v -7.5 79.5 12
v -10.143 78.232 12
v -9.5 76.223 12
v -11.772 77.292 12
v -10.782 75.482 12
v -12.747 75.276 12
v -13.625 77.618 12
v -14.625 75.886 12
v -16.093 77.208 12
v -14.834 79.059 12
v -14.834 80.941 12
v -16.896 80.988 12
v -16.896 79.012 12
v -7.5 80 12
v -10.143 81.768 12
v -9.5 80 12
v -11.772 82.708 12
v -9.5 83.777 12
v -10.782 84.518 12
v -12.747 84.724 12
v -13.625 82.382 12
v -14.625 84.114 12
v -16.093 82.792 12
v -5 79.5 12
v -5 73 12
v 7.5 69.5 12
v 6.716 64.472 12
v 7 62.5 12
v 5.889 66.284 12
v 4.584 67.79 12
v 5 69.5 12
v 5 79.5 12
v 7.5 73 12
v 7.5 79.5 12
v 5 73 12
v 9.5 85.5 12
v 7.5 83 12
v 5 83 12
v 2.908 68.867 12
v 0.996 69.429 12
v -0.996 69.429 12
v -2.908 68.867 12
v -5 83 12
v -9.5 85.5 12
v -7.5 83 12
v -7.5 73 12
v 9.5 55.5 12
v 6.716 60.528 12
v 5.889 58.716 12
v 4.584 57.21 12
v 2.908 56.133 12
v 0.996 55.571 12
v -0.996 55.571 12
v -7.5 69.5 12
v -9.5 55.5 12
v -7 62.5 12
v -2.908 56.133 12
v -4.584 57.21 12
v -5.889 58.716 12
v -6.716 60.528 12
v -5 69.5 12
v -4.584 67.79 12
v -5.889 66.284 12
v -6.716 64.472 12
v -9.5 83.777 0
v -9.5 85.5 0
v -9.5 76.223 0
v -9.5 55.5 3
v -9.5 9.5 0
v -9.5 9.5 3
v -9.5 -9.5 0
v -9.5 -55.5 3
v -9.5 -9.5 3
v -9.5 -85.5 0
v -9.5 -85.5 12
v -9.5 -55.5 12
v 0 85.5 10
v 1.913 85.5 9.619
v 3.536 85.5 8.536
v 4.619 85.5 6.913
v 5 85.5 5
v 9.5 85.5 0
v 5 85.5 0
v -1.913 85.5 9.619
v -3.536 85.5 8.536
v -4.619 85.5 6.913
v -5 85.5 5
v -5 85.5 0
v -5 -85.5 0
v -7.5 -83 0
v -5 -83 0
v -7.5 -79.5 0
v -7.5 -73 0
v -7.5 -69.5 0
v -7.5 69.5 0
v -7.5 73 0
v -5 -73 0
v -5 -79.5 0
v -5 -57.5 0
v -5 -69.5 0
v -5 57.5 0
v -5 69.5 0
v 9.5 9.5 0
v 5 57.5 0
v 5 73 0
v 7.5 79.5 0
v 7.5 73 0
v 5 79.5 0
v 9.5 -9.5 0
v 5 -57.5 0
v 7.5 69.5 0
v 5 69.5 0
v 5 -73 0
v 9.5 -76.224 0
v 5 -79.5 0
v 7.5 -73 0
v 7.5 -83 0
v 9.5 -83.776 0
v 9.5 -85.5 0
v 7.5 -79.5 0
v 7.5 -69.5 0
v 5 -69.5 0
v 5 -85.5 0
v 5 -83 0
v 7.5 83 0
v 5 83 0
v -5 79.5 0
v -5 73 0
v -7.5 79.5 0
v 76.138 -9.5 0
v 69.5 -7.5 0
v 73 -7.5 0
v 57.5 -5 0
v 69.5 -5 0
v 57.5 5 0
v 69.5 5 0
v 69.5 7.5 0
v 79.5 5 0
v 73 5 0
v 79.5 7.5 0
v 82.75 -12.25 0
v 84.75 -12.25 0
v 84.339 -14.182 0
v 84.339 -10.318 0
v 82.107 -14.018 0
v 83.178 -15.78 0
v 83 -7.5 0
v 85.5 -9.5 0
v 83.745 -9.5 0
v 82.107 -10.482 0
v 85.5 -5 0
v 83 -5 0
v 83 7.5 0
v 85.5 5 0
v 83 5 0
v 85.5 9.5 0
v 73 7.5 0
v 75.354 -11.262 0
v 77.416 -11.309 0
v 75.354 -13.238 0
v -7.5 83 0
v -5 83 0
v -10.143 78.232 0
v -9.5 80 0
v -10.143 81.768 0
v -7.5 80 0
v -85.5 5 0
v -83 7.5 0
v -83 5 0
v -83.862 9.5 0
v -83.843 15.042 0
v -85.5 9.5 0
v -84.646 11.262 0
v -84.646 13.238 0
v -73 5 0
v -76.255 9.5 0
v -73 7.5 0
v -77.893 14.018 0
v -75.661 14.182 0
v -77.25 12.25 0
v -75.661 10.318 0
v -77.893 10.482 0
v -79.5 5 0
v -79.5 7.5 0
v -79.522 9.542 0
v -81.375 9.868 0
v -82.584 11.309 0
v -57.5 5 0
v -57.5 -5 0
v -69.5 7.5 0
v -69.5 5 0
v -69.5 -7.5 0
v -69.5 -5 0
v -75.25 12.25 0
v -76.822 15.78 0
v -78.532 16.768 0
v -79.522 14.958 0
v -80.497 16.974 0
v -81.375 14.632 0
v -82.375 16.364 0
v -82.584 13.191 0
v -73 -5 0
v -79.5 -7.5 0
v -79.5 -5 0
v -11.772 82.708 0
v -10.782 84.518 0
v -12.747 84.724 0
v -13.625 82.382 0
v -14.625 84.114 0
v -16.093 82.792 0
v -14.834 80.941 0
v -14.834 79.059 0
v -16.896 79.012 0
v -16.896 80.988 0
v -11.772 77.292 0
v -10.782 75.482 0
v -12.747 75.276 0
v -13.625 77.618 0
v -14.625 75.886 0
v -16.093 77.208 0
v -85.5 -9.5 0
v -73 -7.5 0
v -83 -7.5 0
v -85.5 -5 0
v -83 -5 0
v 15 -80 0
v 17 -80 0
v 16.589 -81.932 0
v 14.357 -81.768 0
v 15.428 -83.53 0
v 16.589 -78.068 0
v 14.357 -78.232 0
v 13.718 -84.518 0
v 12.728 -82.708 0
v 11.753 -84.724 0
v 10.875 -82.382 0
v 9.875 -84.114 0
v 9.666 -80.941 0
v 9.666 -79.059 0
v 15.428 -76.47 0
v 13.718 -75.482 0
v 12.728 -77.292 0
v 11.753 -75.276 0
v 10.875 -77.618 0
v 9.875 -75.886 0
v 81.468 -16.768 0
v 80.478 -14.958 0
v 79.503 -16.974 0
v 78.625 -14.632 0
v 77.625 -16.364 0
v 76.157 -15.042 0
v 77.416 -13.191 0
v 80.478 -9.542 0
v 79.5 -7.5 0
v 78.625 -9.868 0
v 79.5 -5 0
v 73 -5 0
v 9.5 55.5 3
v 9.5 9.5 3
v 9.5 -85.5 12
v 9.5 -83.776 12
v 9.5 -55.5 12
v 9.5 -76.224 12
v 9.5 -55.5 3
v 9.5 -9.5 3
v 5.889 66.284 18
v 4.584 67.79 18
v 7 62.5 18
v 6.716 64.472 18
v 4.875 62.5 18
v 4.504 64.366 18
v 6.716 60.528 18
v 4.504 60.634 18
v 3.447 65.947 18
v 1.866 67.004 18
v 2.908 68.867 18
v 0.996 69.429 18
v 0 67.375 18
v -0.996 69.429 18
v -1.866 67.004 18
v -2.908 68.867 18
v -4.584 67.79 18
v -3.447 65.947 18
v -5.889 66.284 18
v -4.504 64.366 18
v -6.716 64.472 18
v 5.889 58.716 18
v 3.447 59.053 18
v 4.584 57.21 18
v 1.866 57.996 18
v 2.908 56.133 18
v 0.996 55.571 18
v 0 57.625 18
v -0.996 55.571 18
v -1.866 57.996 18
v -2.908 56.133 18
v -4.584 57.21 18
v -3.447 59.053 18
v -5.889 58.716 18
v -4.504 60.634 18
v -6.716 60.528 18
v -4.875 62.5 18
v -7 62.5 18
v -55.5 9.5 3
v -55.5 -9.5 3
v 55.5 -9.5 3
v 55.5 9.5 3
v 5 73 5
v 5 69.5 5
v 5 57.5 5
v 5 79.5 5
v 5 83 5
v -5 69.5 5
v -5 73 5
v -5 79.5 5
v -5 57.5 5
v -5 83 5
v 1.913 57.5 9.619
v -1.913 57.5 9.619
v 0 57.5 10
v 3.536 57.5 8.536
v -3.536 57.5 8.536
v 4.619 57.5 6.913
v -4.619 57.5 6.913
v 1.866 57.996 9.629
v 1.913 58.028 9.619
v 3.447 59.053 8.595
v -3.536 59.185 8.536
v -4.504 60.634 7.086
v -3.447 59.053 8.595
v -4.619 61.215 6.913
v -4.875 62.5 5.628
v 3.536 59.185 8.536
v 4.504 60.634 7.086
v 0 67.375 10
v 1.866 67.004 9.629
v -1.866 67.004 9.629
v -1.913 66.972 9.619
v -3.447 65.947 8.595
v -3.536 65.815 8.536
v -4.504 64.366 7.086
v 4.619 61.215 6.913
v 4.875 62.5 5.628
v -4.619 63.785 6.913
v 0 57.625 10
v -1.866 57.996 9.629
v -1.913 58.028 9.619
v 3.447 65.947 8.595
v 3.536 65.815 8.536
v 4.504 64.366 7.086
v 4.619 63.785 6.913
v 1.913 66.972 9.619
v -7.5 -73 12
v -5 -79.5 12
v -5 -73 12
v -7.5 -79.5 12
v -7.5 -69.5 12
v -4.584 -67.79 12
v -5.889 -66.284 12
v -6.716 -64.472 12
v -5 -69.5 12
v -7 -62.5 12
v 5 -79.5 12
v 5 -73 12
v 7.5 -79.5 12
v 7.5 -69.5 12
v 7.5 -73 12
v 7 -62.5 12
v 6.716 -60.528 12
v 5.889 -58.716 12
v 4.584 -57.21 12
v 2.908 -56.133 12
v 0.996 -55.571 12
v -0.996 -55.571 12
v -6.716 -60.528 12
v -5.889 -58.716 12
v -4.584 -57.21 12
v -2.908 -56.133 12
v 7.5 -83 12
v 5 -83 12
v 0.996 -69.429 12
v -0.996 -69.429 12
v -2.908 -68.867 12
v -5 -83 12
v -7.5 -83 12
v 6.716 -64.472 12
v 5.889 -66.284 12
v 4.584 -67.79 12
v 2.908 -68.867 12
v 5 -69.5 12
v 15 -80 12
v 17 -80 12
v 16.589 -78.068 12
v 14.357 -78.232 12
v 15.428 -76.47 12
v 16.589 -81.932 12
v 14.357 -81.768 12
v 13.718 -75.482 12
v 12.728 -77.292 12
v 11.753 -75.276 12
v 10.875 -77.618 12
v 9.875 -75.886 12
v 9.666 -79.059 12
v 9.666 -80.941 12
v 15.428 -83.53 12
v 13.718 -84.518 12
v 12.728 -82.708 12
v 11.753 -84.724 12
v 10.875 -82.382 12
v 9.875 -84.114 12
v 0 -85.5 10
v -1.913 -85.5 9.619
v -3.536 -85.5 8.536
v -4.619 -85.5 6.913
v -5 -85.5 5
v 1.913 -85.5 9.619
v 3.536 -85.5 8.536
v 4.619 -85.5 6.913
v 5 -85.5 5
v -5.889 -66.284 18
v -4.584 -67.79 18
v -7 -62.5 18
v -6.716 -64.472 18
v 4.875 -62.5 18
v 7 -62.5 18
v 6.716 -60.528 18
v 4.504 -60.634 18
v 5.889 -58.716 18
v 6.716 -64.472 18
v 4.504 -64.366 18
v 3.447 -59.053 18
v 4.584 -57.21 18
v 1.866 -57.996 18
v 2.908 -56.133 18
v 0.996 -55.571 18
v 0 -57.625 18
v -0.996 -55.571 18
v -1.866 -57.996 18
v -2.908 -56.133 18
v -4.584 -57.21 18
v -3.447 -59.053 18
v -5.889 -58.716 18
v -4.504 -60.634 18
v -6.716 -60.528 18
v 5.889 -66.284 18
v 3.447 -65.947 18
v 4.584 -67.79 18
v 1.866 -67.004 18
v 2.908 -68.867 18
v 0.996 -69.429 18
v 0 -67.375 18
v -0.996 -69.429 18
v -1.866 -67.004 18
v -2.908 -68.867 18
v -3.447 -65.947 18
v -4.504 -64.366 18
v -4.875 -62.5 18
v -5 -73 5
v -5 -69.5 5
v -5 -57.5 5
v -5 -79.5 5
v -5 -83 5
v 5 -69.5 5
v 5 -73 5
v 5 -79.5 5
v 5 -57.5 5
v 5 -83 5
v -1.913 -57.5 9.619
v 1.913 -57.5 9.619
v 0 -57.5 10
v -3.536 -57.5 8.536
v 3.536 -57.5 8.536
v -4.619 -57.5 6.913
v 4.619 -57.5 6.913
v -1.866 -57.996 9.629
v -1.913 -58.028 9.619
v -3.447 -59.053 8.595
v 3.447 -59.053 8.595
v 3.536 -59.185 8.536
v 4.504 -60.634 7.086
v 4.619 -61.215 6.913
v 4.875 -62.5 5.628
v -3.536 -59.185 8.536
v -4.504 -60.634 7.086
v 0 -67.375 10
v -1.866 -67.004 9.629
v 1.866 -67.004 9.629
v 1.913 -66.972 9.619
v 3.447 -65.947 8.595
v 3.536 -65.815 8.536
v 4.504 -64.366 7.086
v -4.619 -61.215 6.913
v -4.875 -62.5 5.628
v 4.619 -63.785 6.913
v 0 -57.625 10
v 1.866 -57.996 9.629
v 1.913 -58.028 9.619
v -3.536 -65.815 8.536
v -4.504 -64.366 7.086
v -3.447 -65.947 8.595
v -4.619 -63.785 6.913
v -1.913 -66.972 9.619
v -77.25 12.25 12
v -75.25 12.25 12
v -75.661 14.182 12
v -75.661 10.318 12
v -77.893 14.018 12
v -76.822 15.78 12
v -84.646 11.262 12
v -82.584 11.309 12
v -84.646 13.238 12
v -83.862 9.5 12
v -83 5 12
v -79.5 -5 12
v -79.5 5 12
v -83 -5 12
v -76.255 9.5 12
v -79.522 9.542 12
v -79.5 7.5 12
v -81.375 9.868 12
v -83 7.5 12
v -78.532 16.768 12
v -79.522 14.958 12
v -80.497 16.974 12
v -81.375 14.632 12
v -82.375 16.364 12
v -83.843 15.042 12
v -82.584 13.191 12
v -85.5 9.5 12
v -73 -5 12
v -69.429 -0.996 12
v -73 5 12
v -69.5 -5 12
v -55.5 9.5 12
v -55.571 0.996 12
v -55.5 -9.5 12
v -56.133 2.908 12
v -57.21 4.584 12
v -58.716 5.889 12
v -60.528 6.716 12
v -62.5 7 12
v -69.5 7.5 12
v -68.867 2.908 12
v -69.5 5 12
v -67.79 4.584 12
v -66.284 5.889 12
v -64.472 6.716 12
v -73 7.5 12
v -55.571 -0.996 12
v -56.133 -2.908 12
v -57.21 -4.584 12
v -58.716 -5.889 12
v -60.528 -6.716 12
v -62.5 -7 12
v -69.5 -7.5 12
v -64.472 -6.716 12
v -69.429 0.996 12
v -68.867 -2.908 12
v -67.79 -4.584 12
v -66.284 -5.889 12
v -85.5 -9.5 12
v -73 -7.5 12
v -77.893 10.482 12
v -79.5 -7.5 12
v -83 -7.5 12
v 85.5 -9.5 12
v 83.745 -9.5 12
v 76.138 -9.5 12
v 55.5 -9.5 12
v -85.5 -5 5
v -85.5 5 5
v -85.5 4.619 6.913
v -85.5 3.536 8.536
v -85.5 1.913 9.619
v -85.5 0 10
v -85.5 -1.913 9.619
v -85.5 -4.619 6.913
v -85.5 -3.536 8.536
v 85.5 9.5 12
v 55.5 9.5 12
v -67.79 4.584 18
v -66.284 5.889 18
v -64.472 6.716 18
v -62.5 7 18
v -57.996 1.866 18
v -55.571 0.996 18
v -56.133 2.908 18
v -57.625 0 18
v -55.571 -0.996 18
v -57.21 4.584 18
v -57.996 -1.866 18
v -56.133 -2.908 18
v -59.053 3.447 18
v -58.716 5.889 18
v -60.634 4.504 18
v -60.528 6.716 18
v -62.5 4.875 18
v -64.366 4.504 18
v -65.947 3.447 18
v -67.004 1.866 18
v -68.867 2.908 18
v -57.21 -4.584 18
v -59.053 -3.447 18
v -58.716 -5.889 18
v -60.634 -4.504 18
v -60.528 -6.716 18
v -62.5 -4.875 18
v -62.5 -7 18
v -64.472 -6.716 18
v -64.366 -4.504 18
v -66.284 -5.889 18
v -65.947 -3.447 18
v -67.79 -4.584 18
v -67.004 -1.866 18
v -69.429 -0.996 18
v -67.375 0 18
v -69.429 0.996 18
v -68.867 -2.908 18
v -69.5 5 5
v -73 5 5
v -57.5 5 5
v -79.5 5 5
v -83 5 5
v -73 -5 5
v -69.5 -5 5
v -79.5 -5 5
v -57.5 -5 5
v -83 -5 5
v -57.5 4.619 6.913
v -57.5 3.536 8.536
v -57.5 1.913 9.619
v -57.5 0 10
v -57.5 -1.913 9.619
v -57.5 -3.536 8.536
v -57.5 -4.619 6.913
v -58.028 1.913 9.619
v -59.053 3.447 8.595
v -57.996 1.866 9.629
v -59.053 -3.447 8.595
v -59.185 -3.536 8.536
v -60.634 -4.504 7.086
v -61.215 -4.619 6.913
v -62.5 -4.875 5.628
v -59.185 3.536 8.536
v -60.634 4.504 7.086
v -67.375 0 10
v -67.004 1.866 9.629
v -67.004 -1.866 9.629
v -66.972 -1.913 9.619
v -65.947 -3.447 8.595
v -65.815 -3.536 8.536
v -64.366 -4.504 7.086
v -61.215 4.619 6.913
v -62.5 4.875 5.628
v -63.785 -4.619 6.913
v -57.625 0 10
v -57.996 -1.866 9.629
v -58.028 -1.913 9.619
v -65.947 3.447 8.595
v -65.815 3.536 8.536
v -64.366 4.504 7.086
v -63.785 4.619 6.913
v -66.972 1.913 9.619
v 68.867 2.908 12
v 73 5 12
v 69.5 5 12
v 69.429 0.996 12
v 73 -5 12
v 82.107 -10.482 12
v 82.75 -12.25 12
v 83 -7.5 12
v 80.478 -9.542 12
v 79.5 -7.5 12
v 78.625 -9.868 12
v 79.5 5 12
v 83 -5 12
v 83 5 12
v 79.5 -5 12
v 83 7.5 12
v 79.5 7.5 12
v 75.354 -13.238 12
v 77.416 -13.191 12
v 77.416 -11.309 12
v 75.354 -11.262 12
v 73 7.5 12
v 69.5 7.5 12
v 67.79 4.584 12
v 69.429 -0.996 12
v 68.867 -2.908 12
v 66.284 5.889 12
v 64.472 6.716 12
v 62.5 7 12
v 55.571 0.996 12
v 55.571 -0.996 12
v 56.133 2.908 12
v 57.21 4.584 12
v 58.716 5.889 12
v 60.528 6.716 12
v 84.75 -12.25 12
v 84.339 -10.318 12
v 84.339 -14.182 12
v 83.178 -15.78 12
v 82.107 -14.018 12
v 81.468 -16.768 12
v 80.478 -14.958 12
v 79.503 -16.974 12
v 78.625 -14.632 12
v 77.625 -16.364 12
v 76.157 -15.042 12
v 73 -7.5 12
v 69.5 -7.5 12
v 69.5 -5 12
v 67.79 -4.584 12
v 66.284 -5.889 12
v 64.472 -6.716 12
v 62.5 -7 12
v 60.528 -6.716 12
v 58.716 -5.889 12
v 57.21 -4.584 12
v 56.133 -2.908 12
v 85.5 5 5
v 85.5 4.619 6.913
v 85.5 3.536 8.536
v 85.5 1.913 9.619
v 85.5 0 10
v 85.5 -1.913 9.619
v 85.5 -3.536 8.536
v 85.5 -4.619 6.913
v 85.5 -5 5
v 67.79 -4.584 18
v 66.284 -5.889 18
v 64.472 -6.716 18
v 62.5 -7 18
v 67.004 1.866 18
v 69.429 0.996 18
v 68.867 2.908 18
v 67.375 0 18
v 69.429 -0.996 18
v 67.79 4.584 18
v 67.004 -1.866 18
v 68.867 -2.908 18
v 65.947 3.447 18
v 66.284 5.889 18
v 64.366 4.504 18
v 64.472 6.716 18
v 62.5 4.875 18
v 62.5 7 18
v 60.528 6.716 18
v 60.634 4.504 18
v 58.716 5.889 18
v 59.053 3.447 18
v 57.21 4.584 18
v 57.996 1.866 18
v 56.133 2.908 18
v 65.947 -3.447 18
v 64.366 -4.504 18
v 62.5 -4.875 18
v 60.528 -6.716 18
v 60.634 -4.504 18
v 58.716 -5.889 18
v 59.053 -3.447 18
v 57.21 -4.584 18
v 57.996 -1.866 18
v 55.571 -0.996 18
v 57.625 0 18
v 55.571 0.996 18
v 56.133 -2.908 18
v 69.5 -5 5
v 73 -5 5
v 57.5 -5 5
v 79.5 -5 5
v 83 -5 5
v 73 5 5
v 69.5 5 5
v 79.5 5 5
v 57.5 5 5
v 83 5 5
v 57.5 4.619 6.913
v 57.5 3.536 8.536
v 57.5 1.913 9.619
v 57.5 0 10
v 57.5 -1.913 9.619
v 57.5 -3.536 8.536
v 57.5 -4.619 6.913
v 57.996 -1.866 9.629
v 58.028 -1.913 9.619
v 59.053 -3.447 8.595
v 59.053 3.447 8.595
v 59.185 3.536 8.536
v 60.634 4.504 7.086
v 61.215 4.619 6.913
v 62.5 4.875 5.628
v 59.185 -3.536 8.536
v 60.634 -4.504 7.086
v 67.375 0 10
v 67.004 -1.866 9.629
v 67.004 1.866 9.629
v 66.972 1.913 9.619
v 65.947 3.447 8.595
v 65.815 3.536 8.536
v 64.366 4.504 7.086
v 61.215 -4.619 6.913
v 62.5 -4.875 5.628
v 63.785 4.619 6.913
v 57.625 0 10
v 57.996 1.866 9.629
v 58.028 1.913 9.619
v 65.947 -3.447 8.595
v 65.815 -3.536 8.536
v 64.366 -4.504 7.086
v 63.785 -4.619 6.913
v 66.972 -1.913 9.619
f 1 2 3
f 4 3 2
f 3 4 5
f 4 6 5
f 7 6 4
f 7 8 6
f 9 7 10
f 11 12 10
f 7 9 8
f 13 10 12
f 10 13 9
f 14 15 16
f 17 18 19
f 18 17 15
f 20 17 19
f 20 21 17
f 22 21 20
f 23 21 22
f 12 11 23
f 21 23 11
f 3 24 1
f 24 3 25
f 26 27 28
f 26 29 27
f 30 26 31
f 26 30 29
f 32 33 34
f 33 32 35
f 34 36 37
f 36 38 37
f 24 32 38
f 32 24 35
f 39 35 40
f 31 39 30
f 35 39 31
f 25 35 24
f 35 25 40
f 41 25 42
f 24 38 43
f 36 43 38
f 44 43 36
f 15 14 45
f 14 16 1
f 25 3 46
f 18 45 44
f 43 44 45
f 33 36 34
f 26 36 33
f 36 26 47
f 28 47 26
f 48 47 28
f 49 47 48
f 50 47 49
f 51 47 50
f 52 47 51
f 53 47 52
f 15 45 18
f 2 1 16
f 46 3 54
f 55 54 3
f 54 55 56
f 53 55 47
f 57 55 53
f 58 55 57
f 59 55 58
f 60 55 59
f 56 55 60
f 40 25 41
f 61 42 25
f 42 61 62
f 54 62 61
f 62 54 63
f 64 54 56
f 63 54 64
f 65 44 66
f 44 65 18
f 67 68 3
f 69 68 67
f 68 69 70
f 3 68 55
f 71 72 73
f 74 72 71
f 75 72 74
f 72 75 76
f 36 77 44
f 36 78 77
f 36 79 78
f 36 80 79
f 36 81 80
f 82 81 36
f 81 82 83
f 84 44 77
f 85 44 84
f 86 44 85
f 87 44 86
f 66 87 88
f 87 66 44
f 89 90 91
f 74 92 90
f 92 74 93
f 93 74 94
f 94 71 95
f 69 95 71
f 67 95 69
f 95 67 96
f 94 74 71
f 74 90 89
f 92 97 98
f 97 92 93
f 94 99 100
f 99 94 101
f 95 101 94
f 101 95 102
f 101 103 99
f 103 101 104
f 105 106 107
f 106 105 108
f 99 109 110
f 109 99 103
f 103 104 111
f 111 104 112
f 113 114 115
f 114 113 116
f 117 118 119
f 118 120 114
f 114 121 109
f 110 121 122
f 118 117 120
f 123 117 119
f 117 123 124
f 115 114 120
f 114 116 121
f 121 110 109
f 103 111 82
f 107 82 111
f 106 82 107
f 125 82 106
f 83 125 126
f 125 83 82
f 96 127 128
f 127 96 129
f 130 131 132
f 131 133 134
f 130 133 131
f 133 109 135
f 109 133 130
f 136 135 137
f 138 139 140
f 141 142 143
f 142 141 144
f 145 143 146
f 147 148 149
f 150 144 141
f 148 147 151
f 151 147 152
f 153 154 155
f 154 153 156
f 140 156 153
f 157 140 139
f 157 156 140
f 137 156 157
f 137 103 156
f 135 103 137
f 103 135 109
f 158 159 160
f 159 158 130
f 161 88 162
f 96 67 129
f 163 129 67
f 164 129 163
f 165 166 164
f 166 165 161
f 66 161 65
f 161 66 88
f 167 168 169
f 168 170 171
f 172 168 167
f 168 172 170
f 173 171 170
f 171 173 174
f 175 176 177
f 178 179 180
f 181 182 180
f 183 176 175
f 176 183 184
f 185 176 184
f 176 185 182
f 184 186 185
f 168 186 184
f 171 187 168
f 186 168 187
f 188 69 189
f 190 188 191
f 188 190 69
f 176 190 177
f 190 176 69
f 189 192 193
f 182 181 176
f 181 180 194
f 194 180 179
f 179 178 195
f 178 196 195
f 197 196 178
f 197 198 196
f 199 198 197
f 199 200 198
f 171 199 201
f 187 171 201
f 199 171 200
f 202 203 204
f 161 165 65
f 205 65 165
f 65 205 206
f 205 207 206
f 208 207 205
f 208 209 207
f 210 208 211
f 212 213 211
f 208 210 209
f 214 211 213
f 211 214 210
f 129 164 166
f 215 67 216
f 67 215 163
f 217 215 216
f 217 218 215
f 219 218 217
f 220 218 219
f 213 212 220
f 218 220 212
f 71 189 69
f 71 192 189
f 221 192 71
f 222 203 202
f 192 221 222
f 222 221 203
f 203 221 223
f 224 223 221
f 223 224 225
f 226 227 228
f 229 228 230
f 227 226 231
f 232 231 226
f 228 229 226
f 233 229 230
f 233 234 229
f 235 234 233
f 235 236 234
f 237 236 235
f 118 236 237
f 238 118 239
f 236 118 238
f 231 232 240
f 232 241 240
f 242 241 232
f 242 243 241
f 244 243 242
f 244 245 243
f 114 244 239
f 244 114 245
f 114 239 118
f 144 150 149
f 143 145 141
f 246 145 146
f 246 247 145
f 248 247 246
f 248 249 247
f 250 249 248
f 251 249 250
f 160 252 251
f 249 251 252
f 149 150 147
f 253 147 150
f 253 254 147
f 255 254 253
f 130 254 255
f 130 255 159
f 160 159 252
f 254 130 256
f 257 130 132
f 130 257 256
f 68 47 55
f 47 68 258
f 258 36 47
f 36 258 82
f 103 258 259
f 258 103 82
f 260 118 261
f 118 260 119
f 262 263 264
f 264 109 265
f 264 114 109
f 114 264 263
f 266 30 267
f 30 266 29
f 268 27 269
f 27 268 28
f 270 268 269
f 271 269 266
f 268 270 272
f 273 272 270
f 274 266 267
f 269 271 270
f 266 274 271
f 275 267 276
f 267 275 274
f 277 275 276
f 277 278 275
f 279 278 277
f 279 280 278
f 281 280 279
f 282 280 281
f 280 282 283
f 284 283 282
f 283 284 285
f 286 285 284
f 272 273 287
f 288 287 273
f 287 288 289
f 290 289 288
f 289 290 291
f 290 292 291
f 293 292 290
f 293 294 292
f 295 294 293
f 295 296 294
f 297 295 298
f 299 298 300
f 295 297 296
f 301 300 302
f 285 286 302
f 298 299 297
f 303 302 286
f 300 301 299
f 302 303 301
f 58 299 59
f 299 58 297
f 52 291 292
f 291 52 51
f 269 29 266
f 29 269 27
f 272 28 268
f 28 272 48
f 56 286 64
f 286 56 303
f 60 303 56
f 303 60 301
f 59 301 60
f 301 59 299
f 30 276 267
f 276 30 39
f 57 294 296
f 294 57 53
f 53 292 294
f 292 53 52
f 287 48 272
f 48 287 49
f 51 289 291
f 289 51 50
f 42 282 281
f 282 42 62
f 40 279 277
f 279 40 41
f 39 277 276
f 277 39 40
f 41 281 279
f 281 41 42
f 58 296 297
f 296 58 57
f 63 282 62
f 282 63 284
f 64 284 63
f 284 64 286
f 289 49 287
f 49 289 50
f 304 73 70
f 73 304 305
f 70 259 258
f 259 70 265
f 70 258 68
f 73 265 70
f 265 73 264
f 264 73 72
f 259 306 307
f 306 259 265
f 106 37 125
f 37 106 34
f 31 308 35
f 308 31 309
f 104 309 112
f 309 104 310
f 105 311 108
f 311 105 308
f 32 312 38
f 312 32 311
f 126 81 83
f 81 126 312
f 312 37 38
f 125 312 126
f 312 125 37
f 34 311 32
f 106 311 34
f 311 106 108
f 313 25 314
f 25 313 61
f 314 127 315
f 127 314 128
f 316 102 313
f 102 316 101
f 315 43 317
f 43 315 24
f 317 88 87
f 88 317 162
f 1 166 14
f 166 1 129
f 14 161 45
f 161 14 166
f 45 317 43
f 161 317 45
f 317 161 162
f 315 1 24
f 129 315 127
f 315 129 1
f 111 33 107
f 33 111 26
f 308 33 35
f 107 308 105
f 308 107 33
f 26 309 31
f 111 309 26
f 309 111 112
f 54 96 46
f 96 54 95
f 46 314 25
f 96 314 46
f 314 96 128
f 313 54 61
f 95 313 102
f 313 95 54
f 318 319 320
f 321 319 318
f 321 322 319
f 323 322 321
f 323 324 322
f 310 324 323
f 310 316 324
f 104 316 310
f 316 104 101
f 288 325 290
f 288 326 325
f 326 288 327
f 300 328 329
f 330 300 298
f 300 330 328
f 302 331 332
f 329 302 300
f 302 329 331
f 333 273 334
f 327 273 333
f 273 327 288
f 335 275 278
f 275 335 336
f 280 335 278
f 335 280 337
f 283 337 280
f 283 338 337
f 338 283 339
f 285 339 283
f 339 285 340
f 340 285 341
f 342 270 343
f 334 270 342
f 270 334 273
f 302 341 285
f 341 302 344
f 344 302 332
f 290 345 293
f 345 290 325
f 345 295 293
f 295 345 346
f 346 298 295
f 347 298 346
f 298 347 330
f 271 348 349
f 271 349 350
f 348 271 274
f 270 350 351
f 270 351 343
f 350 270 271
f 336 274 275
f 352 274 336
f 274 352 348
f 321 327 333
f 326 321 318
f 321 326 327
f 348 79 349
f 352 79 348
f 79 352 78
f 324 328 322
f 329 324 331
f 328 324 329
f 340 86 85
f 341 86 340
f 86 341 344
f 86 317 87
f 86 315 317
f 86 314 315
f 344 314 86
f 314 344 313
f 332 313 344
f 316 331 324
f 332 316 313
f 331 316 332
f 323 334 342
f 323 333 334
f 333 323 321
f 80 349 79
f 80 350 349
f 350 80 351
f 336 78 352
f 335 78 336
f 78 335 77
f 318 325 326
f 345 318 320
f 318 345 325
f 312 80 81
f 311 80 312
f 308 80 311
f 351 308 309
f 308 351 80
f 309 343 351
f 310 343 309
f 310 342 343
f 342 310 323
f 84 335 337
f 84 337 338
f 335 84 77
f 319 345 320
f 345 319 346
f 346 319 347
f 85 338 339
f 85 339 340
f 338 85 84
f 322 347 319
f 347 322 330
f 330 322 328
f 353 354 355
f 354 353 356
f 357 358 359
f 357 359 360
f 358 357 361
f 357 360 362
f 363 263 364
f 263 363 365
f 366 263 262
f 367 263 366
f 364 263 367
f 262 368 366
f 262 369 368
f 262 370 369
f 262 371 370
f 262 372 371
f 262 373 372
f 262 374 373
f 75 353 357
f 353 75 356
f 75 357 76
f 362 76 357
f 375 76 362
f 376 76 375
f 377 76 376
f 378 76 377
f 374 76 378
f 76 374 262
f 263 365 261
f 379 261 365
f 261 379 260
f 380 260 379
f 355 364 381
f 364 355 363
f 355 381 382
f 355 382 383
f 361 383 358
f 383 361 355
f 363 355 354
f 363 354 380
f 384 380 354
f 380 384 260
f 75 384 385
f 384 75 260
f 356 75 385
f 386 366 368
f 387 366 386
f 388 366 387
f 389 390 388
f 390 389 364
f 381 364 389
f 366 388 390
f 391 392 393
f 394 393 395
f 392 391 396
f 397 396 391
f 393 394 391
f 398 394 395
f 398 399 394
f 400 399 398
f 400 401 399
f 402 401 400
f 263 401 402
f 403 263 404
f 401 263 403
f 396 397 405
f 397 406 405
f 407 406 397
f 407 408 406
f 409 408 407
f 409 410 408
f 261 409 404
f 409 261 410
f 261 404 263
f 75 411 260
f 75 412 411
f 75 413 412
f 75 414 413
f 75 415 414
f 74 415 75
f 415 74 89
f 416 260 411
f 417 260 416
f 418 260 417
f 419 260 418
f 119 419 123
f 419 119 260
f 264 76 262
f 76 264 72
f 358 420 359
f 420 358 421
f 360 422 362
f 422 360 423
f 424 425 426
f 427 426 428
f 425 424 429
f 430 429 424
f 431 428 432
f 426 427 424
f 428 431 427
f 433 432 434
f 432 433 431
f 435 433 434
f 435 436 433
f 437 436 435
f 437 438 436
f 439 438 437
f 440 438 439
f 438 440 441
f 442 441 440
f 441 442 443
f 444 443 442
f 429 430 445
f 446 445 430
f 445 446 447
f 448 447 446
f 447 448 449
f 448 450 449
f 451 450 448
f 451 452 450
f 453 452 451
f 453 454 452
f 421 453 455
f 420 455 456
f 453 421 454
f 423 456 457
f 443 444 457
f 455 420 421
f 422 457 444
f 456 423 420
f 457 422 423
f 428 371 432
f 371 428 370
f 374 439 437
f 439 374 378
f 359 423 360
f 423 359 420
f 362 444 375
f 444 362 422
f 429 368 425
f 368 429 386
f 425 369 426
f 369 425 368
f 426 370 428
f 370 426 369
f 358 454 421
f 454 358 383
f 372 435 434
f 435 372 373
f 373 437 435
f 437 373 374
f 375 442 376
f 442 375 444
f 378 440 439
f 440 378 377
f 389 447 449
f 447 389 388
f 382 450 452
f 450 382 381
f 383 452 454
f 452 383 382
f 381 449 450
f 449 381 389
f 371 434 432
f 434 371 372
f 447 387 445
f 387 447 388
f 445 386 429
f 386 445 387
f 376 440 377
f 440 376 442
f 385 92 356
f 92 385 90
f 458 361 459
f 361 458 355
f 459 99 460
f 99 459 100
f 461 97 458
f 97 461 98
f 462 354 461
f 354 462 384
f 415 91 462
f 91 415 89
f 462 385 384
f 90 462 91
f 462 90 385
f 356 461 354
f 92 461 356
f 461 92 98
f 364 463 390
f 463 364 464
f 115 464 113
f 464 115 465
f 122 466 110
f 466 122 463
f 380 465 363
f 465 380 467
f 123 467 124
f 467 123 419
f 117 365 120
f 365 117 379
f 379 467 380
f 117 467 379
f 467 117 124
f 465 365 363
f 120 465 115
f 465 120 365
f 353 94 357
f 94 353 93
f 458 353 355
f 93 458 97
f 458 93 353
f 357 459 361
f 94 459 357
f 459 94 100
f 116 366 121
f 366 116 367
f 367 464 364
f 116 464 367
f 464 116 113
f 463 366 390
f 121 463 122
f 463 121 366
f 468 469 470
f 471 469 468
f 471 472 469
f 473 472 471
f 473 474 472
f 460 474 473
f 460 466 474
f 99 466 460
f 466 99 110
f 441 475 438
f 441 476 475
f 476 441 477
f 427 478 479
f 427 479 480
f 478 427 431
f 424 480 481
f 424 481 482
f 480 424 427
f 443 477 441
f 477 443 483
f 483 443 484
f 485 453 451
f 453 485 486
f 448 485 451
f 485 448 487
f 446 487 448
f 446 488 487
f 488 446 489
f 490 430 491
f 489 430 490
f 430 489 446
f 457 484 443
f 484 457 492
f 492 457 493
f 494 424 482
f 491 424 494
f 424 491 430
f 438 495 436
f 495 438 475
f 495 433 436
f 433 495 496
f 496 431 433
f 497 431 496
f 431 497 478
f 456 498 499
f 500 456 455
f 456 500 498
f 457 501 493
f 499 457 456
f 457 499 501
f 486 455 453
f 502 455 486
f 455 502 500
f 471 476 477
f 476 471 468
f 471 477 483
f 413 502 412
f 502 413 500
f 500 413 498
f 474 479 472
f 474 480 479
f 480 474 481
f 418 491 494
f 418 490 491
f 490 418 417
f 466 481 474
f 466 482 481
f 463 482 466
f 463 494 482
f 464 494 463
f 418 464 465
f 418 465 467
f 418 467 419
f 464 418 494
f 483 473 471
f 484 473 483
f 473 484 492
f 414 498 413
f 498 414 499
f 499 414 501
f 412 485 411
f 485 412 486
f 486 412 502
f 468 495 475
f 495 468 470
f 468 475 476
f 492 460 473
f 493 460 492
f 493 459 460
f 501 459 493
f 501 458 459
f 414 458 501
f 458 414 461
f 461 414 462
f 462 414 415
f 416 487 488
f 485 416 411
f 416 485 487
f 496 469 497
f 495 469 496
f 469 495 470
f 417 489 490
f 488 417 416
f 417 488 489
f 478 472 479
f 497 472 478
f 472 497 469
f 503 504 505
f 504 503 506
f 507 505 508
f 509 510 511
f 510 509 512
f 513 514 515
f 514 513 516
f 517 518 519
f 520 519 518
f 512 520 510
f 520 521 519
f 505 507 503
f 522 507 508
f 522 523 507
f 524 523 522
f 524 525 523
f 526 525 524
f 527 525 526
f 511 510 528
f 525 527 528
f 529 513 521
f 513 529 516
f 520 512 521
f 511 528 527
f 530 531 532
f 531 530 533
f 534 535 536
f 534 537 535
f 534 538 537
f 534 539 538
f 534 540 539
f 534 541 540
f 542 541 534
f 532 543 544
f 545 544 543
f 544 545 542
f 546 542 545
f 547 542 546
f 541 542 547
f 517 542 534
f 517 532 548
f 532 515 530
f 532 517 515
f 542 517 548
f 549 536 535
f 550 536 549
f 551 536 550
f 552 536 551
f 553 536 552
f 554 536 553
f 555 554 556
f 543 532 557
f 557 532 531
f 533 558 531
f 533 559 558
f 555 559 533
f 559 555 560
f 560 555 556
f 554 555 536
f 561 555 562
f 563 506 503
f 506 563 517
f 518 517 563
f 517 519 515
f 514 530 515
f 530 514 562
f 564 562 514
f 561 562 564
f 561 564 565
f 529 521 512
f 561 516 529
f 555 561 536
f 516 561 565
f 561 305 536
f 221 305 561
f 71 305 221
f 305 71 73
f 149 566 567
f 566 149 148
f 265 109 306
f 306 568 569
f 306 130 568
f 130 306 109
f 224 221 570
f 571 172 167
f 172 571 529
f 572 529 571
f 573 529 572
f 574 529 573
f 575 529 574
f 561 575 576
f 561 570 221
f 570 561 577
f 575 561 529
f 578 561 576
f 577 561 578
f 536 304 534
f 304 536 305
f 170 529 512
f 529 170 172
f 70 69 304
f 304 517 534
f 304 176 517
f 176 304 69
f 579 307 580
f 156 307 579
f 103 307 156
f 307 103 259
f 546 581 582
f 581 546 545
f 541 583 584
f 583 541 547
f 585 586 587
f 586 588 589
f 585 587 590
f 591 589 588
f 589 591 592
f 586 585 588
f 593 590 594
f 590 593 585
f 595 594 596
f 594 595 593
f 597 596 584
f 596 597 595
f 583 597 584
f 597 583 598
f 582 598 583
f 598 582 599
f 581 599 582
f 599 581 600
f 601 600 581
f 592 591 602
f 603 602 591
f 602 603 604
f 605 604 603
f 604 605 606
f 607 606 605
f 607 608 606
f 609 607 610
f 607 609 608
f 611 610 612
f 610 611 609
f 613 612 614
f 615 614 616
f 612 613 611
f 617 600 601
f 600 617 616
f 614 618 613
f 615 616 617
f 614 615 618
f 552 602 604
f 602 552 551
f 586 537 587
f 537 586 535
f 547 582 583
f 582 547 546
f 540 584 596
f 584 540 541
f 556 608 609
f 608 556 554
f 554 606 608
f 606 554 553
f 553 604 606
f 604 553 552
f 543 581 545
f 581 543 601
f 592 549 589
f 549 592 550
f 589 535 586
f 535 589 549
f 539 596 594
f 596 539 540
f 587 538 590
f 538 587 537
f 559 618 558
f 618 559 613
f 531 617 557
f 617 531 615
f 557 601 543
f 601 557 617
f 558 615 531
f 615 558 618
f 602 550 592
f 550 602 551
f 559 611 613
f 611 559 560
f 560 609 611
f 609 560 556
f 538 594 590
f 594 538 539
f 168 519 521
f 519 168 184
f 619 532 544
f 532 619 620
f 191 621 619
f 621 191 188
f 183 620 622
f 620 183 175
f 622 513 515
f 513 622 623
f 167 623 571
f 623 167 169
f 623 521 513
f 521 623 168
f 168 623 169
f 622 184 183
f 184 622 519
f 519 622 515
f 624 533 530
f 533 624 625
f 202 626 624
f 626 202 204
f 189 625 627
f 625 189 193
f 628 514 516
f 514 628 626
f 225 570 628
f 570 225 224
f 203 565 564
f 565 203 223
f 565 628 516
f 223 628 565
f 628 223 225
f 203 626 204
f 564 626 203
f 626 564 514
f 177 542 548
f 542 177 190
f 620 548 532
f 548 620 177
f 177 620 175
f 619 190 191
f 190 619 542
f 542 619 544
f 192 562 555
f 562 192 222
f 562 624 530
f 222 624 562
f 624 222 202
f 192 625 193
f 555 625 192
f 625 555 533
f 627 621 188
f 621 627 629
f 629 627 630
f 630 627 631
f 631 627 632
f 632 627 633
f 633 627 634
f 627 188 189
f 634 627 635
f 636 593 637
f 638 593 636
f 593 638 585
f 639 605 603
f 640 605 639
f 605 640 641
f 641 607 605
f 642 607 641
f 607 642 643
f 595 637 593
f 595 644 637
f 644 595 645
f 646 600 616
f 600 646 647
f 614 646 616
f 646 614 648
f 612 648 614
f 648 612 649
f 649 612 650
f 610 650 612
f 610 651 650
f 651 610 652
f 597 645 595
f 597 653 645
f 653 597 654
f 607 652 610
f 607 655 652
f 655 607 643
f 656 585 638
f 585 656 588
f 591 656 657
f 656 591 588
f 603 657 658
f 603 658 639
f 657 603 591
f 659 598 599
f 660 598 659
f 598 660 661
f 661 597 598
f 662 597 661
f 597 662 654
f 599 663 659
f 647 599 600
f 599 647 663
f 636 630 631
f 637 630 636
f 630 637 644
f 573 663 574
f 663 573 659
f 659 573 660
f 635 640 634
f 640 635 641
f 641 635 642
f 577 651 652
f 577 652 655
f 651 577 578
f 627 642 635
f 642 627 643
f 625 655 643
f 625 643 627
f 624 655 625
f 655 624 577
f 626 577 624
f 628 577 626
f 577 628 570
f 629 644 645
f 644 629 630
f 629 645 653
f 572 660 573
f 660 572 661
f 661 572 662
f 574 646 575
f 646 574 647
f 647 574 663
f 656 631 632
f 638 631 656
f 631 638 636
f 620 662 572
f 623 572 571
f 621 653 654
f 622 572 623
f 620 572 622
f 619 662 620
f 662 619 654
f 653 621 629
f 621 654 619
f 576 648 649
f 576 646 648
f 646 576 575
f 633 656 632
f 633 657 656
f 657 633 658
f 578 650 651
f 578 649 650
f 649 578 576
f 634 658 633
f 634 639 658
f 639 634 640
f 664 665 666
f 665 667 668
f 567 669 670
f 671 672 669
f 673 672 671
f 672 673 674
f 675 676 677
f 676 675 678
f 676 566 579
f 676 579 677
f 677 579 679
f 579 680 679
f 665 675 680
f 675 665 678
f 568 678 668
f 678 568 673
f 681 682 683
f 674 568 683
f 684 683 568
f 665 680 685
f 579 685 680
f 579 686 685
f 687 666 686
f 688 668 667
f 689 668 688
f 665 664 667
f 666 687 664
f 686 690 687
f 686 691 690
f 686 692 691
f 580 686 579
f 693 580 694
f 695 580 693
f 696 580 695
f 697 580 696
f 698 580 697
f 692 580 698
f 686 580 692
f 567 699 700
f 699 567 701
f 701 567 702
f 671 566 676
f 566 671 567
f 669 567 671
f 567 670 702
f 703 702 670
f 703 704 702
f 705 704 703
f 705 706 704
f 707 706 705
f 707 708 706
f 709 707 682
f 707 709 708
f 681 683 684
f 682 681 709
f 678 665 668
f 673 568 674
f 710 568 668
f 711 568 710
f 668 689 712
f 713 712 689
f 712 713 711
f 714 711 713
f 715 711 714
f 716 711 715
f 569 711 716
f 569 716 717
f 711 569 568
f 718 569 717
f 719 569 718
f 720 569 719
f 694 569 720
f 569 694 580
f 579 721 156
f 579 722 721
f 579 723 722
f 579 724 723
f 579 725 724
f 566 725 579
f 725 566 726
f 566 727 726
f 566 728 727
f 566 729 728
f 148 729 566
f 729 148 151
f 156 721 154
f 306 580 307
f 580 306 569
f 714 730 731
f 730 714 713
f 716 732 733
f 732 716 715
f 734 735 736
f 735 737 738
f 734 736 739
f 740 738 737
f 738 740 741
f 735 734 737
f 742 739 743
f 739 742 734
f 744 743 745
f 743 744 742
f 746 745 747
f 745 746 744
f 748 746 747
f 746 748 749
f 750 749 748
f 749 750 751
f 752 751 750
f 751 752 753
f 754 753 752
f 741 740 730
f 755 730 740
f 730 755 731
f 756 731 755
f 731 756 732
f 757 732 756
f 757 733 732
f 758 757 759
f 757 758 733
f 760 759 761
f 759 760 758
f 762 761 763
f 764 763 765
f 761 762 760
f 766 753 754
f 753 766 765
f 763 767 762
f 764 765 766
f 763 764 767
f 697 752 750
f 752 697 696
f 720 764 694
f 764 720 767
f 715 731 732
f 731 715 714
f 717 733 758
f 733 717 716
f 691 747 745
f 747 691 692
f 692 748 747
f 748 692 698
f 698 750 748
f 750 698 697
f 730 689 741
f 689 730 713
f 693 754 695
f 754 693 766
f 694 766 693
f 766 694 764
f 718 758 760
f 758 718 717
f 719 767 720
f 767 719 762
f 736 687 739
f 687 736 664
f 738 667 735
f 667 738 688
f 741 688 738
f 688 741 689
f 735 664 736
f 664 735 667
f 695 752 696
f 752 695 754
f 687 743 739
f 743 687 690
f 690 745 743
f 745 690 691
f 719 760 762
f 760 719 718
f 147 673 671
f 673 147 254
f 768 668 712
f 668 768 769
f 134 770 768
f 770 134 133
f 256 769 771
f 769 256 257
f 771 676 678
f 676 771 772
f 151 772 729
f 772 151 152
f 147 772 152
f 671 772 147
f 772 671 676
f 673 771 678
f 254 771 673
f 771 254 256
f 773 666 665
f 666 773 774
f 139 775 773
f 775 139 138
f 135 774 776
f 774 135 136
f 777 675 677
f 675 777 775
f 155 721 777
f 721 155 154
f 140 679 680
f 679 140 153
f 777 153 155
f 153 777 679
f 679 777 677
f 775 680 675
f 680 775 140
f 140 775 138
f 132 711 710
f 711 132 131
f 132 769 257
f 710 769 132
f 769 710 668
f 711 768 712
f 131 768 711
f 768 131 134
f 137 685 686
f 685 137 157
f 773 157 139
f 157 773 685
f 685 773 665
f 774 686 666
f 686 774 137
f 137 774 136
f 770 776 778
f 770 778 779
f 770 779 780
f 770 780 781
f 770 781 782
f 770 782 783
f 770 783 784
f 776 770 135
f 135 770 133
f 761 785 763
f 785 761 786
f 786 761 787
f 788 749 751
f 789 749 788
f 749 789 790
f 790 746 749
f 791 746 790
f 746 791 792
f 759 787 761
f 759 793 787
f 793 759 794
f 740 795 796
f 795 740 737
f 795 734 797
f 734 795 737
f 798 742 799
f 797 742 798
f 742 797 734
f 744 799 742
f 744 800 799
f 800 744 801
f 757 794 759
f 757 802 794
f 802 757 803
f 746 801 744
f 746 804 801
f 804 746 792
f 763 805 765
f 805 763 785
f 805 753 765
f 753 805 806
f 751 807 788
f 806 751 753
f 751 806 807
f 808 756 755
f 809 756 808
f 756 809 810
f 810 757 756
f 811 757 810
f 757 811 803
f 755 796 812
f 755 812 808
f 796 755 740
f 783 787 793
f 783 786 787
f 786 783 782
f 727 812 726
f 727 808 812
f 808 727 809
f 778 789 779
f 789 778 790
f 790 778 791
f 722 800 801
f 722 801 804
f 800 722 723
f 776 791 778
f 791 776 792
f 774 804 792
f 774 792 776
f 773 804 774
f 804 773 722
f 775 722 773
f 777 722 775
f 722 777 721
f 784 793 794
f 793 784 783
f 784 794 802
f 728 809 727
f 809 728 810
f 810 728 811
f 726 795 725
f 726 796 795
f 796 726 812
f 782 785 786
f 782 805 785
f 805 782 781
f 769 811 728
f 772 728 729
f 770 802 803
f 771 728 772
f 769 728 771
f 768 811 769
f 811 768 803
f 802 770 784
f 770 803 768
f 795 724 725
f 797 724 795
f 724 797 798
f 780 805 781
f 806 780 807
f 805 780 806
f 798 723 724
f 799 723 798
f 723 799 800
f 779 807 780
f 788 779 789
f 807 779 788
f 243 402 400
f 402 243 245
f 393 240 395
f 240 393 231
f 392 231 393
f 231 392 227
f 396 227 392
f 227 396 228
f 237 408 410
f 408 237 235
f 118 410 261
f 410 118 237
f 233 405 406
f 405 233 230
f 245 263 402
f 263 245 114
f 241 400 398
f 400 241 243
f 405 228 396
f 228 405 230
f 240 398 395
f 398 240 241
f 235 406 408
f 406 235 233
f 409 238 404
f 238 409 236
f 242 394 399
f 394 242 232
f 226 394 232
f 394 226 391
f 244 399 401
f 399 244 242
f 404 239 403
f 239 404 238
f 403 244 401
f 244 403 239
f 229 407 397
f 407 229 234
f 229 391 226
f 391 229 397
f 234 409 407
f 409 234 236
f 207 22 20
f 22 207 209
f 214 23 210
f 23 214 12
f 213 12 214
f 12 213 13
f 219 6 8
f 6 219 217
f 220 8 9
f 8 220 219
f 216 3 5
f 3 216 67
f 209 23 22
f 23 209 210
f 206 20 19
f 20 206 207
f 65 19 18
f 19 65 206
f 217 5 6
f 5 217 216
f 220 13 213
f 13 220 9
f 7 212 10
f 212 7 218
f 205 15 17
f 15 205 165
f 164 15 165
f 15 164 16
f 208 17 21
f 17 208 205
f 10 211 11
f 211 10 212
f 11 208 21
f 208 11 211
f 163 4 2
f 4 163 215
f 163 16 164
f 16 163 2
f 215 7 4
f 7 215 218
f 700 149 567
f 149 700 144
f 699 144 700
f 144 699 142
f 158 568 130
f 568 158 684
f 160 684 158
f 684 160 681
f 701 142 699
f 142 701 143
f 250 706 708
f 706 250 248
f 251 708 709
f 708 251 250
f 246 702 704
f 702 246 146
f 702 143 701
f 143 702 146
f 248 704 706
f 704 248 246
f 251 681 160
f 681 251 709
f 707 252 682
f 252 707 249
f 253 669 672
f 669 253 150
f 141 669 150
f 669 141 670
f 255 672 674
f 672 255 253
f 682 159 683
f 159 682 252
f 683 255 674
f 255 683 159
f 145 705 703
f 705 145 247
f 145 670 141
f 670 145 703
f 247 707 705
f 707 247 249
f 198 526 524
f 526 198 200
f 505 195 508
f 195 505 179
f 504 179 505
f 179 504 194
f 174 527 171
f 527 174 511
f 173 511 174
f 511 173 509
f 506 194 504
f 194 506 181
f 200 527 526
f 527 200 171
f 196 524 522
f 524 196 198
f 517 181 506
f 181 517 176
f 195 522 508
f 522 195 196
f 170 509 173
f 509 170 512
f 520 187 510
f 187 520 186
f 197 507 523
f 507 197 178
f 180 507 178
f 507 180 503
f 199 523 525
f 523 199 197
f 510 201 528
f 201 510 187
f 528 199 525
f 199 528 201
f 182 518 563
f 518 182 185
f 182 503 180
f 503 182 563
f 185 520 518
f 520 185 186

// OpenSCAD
wave_length=125;
antenna_width=10;
antenna_stalk_width=10-0.25;
antenna_base_length=23;

base_width=wave_length+2*antenna_base_length;
height=antenna_width+8;

ziptie_width=3.5;
ziptie_depth=2.5;

screw_r=5.5/2;
backing=2;
edges=2;

module antenna_cutout() {
    difference() 
    {
            
    //translate([0,0,0]) cube([30,30,height]);    
    union() {
        translate([antenna_width/2+edges+ziptie_depth,antenna_width/2+backing,0]) rotate([0,0,180]) 
            cube([
        antenna_width+ziptie_depth*2+edges*2,
        antenna_base_length+antenna_width/2+backing,
        antenna_width+backing]);
        
        cylinder(height,antenna_width/2+backing,antenna_width/2+backing);
         translate([-(antenna_width+ziptie_depth*2+edges*2)/2,0,0]) cube([antenna_width+ziptie_depth*2+edges*2,
        wave_length-antenna_width-2*backing,3]);
    }
        translate([0,0,antenna_width/2]) antenna();
    }
}

module antenna() {
    //antenna cutout below
    translate([antenna_width/2,antenna_width/2,-antenna_width]) rotate([0,0,180]) cube([antenna_width,antenna_base_length+antenna_width/2,antenna_width]);
    
    //the base antenna
    cylinder(height*4,antenna_stalk_width/2,antenna_stalk_width/2);
    translate([0,antenna_width/2,0]) rotate([90,0,0]) {
        cylinder(antenna_base_length+antenna_width/2,antenna_width/2,antenna_width/2);
        }
    
    
    //a ziptie
    rotate([0,0,180]) translate([antenna_width/2,antenna_width/2+2,-antenna_width]) {
        
        cube([ziptie_depth,ziptie_width,height*2]);
        translate([-antenna_width-ziptie_depth,0,0]) cube([ziptie_depth,ziptie_width,height*2]);
        translate([0,10,0]) {
            cube([ziptie_depth,ziptie_width,height*2]);
            translate([-antenna_width-ziptie_depth,0,0]) cube([ziptie_depth,ziptie_width,height*2]);
        }
    }
}

module screw_hold() {
    difference() {
        cylinder(antenna_width+backing,screw_r+backing,screw_r+backing);
        cylinder(antenna_width+backing,screw_r,screw_r);
    }
}

rotate([0,0,0]) //difference() 
{
    //translate([-base_width/2,-base_width/2,0]) cube([base_width,base_width,height]);
    translate([0,0,0]) {
        translate([0,wave_length/2,0]) rotate([0,0,180]) antenna_cutout();
        translate([0,-wave_length/2,0]) antenna_cutout();
        rotate([0,0,90]) {

            translate([0,wave_length/2,0]) rotate([0,0,180]) antenna_cutout();
            translate([0,-wave_length/2,0]) antenna_cutout();
        }
    }
    
    k1=antenna_width/2+ziptie_depth+(screw_r+backing);
    k2=wave_length/2+antenna_base_length-screw_r*2;
    translate([k1,-k2,0]) screw_hold();
    translate([-k1,k2,0]) screw_hold();
    translate([k2,-k1,0]) screw_hold();
    translate([-k2,k1,0]) screw_hold();
    //z=wave_length*0.9;
    //translate([-z/2,-z/2]) cube([z,z,height*2]);
    
    
    /*translate([-base_width/2,wave_length/8,-3]) cube([base_width,wave_length/4,height]);
    rotate([0,0,90]) translate([-base_width/2,wave_length/8,-3]) cube([base_width,wave_length/4,height]);
    rotate([0,0,2*90]) translate([-base_width/2,wave_length/8,-3]) cube([base_width,wave_length/4,height]);
    rotate([0,0,3*90]) translate([-base_width/2,wave_length/8,-3]) cube([base_width,wave_length/4,height]);*/
}
//cube([10,20,height]);
